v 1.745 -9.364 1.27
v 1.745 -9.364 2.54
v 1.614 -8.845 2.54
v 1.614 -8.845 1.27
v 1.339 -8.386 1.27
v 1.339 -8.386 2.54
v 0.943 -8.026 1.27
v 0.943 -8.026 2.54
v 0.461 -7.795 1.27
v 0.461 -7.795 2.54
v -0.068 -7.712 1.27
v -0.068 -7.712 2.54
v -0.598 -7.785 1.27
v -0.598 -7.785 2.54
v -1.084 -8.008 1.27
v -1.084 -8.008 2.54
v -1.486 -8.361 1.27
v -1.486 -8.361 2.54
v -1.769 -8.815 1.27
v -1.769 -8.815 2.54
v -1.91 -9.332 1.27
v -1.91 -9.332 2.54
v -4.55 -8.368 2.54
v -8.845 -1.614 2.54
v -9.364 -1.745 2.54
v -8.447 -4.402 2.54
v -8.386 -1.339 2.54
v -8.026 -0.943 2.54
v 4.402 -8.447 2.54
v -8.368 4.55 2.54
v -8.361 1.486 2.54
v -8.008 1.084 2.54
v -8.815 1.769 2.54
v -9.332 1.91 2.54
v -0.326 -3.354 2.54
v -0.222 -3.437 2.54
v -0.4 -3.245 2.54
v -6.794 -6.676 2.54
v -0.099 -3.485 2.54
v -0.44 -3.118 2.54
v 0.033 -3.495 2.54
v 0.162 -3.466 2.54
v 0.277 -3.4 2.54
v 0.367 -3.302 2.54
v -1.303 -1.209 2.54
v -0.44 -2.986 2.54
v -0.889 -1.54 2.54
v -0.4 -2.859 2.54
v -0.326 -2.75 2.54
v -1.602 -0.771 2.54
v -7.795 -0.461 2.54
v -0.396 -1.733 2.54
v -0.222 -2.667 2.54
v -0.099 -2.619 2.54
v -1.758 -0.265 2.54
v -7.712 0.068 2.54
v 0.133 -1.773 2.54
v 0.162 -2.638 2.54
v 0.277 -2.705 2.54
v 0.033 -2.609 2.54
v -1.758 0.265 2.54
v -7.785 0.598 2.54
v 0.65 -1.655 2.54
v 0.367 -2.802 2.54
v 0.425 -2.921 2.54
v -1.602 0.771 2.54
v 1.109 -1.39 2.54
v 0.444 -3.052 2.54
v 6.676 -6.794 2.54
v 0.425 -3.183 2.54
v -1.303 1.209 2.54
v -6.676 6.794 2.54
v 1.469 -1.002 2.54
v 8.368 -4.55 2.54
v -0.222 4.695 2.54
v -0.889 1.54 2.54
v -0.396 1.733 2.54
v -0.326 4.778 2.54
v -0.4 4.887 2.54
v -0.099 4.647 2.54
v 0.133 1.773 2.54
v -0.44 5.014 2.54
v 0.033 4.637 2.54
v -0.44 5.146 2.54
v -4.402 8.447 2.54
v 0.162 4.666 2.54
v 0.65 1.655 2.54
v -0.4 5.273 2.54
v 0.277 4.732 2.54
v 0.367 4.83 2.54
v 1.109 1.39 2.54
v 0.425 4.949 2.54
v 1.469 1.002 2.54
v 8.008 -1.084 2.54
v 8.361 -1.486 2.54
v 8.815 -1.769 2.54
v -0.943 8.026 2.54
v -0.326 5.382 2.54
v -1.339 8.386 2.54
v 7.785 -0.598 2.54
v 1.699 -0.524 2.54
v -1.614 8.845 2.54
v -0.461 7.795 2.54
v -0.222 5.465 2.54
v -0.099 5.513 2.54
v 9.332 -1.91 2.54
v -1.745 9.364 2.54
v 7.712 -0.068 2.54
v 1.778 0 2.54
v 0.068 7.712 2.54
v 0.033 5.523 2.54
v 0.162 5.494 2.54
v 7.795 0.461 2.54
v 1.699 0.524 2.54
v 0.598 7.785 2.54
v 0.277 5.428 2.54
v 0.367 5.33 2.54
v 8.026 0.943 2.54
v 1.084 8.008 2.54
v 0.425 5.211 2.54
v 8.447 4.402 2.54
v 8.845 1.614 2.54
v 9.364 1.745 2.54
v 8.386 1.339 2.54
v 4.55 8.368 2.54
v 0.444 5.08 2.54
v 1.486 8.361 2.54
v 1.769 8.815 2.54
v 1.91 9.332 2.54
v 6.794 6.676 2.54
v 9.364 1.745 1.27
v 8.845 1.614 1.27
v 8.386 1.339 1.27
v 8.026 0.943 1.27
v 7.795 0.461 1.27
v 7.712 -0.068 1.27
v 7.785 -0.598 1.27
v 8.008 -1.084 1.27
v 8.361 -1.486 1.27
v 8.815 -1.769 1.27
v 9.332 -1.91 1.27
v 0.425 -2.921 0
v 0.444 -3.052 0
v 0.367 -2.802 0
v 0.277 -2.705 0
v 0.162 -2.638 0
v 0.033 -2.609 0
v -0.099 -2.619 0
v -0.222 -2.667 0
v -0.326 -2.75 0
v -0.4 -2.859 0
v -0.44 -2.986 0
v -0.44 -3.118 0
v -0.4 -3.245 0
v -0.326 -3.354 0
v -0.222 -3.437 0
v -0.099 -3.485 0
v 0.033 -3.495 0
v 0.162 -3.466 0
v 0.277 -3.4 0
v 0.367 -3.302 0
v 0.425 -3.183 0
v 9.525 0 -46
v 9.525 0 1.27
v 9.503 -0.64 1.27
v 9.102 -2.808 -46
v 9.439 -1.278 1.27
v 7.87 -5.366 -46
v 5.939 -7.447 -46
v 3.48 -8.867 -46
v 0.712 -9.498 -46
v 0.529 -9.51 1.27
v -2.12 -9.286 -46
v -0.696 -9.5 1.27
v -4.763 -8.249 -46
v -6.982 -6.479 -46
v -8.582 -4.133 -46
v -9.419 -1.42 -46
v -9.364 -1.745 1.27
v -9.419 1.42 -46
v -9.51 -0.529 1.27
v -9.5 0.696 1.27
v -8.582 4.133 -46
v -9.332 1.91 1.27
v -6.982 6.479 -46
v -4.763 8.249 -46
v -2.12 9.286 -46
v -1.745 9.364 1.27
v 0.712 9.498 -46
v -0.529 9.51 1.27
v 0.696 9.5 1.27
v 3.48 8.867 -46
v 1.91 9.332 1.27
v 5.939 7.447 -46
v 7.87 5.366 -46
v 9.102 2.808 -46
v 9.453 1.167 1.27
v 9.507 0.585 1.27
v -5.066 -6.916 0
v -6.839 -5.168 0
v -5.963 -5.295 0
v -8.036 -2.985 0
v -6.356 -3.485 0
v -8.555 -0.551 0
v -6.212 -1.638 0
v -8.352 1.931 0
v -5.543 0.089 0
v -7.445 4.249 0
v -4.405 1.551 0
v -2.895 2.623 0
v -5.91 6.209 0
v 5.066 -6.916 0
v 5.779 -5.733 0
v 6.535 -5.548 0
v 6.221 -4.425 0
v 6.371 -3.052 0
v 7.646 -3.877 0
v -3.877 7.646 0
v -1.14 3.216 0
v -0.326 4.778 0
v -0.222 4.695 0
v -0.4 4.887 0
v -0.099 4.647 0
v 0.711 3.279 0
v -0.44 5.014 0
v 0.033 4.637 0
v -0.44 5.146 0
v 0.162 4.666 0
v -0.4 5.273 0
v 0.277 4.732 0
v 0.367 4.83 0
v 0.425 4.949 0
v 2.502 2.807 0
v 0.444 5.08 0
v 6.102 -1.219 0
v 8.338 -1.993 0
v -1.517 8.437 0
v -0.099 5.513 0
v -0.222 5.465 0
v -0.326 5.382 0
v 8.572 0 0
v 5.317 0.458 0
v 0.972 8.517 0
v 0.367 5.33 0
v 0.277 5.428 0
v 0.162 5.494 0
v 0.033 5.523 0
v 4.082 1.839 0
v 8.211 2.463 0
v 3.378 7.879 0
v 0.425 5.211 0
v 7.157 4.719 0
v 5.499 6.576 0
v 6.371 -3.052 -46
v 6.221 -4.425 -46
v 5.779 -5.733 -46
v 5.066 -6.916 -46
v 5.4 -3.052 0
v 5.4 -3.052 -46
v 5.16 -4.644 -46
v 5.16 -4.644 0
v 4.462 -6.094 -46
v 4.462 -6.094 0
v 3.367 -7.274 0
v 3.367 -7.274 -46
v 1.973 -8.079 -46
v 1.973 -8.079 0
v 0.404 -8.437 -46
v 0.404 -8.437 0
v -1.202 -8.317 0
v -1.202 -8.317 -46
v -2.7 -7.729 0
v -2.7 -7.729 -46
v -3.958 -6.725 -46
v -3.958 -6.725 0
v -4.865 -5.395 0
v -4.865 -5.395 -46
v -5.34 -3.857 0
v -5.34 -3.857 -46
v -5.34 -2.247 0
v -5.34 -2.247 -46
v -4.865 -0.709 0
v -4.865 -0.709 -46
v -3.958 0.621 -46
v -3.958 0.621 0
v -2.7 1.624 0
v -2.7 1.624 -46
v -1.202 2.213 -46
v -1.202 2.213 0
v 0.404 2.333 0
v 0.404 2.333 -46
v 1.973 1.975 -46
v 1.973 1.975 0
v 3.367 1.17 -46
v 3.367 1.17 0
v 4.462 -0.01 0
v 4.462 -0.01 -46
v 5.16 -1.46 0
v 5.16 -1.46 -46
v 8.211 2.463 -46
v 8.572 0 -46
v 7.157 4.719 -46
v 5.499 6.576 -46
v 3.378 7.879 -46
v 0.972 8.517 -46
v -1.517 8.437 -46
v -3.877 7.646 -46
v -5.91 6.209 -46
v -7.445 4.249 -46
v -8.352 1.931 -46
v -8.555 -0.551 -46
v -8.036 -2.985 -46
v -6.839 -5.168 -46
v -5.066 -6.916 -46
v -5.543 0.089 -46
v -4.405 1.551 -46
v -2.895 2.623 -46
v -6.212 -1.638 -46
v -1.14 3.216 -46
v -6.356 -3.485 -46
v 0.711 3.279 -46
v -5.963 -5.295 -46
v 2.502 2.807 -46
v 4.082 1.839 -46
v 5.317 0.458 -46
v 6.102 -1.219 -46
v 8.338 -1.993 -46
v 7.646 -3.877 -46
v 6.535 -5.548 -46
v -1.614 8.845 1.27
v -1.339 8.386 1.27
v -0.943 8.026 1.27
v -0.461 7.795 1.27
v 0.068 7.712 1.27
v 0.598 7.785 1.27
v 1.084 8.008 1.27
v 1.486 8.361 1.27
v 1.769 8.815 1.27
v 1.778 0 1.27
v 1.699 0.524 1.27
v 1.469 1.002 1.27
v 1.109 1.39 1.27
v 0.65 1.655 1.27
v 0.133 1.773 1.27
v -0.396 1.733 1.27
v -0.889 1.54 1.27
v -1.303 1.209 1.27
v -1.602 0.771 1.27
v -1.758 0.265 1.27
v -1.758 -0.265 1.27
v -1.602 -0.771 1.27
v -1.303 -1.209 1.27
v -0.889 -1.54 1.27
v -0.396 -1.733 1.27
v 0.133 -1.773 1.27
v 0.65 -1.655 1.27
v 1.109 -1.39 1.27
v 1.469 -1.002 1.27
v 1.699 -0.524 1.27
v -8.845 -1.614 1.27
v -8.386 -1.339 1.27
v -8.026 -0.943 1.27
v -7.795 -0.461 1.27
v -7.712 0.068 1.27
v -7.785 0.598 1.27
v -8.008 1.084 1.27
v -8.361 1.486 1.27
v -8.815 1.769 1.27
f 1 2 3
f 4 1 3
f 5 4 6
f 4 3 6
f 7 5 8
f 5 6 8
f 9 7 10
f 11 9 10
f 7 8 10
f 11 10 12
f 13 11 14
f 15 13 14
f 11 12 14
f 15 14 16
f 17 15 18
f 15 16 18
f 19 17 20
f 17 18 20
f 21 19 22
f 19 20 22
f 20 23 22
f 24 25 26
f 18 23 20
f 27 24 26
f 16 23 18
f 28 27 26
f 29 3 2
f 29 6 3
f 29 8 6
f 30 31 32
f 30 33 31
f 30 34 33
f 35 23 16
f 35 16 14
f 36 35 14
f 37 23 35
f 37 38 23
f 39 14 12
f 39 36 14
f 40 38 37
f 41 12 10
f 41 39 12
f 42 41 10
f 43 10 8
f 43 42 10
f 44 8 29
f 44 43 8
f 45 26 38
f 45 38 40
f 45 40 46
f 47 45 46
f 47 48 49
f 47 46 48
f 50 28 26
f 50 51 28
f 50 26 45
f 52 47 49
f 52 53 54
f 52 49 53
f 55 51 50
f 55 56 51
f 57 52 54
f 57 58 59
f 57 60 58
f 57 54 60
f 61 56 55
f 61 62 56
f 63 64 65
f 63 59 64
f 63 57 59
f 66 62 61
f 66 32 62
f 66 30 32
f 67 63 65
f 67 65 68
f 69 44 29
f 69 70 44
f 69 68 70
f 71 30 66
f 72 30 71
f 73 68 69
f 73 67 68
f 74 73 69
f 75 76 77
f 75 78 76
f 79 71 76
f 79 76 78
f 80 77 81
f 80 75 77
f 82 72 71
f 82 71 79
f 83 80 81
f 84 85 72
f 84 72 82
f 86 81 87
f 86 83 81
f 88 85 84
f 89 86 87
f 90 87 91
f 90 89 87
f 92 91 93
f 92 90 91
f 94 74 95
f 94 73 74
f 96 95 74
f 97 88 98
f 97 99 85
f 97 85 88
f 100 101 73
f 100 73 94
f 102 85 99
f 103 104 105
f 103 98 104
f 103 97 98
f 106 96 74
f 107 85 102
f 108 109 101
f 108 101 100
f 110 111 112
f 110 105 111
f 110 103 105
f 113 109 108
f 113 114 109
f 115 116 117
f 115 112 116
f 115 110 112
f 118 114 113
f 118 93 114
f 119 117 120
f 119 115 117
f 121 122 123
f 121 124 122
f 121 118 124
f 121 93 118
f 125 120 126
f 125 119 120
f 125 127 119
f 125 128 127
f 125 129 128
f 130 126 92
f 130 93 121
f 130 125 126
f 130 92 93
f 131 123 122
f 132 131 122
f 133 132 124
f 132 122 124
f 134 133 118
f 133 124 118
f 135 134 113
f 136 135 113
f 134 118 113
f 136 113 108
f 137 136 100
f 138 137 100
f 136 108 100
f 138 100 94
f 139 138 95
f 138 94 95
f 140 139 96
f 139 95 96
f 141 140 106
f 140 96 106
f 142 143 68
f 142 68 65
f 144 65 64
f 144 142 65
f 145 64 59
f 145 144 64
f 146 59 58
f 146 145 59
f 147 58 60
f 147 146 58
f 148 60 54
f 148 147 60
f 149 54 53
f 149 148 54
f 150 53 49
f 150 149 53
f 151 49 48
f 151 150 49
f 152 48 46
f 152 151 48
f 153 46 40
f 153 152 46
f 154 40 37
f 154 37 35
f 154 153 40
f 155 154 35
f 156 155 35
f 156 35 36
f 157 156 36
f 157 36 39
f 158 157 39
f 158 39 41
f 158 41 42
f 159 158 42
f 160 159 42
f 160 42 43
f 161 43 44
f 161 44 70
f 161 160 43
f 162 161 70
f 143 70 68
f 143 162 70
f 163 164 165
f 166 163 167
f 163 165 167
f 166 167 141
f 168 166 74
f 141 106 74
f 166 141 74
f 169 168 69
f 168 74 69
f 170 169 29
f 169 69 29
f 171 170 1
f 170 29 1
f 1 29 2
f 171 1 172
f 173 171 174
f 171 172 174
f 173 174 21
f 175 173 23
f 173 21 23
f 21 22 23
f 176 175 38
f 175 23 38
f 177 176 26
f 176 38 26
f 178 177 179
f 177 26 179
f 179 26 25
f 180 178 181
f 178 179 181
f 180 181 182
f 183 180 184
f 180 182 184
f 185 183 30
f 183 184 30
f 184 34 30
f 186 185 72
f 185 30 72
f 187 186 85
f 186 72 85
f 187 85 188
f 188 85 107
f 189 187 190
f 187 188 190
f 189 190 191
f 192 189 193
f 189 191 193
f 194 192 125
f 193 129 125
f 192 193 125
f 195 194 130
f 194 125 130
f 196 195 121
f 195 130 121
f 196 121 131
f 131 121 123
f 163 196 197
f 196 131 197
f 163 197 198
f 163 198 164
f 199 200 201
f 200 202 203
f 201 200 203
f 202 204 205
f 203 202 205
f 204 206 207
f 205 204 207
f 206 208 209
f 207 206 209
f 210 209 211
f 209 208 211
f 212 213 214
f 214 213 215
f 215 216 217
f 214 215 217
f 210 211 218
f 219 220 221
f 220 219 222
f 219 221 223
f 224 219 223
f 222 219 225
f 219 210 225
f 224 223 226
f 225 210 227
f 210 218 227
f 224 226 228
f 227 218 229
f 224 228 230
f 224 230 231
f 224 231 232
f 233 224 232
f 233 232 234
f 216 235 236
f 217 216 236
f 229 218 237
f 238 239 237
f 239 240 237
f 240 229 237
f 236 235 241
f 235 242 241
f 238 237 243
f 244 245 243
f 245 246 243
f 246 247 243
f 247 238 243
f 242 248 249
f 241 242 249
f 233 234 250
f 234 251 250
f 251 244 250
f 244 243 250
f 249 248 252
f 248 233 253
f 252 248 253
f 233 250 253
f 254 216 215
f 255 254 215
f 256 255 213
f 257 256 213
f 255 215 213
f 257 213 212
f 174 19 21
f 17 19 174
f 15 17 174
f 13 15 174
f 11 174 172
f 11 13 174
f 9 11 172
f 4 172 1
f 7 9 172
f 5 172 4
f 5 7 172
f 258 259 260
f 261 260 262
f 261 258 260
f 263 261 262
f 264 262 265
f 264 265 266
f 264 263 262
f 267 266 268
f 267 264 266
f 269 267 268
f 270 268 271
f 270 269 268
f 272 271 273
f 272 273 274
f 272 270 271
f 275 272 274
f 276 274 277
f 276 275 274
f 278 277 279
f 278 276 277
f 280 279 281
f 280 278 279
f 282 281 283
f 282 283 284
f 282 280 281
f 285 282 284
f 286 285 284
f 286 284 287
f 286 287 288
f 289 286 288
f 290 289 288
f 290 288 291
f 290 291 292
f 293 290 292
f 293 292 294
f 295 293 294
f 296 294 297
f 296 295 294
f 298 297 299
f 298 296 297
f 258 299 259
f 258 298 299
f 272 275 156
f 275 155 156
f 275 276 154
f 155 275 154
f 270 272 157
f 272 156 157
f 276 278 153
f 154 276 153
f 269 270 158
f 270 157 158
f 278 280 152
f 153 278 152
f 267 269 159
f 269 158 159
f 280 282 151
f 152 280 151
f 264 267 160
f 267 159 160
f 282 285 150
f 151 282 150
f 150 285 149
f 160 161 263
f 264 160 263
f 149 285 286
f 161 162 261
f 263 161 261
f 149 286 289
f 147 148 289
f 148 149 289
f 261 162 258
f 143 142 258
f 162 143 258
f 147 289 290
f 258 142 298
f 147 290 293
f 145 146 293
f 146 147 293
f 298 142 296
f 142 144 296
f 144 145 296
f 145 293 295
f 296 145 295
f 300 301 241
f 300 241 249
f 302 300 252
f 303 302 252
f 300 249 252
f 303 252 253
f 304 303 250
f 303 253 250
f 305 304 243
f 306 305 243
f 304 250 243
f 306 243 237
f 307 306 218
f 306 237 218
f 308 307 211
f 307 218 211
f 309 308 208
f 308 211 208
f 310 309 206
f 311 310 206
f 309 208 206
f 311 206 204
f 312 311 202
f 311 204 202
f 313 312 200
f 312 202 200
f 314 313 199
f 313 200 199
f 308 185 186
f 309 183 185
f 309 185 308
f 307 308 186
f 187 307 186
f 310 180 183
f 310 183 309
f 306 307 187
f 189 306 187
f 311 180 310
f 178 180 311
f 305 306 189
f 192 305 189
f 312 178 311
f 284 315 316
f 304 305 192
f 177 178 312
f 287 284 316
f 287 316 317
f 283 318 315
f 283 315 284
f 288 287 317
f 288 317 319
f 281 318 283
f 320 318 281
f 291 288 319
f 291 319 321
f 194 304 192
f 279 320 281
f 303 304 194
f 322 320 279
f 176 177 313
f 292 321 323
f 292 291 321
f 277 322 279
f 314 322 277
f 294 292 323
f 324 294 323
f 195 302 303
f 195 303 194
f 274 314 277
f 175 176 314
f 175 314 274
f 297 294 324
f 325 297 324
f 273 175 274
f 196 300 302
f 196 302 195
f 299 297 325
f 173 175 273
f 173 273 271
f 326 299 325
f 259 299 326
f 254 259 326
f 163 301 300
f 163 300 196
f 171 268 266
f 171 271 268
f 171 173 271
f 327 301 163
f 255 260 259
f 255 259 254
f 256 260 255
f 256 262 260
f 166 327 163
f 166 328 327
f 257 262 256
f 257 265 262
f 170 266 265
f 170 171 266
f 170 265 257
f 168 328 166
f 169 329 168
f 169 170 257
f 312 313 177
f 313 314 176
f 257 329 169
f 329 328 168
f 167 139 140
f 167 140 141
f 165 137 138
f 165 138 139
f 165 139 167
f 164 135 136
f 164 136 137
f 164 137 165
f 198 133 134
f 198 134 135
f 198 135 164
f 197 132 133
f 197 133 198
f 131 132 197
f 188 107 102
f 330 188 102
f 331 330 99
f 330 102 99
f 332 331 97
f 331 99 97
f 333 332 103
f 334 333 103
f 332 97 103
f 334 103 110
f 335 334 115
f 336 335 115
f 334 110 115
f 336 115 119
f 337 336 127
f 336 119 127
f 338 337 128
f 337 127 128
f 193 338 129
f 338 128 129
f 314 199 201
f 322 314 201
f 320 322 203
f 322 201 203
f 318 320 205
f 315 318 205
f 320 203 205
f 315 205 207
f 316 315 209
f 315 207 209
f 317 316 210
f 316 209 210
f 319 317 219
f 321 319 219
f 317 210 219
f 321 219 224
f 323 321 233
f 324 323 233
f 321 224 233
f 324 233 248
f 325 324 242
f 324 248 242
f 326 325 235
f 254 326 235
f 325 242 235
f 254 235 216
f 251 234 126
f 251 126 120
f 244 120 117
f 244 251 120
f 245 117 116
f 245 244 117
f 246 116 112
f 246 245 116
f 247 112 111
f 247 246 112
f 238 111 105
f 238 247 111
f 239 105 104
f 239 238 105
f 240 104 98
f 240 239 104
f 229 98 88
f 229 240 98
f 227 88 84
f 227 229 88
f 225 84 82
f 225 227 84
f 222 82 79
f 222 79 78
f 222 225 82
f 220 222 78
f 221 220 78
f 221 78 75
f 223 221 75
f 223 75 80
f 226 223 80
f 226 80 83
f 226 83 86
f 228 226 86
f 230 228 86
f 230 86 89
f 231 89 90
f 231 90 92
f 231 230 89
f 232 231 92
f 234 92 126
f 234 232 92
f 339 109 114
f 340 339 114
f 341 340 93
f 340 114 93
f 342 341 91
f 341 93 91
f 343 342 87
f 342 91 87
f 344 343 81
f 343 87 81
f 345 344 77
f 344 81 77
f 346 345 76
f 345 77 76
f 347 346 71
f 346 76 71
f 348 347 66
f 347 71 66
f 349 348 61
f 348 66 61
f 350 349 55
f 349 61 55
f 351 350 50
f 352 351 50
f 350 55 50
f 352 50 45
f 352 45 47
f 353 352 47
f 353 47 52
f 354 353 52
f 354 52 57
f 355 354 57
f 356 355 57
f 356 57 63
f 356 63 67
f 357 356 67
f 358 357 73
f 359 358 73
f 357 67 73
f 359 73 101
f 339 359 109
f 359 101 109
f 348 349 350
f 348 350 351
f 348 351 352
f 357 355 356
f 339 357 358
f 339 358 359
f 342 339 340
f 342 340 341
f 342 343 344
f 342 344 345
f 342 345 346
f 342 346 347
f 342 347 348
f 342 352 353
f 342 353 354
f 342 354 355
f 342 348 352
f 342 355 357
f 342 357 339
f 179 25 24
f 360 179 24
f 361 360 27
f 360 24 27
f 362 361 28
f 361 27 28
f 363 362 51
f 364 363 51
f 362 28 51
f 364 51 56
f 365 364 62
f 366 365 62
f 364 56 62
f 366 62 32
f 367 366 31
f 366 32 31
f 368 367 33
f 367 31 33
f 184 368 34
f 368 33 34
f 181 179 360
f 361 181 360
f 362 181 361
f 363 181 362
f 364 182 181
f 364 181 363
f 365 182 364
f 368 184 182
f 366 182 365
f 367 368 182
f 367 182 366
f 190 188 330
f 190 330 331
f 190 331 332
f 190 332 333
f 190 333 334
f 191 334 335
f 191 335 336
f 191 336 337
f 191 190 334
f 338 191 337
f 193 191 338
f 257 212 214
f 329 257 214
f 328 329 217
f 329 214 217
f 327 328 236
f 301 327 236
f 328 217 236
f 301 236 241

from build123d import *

# Parameters (mm, degrees)
F0_R     = 9.525
F0_R_2   = 0.4445
F1_DEPTH = 2.54
F2_R     = 1.778
F3_DEPTH = 1.27
F4_R     = 9.525
F4_R_2   = 5.4
F5_DEPTH = 46


# Not quite as in the source:
# - a feature names something its author has since deleted; it is built from what else it names


with BuildPart() as f1:
    # F0 (on Top) → F1 (new body)
    with BuildSketch(Plane.XY):
        Circle(F0_R)
        with Locations((0, -3.0520705041)):
            Circle(F0_R_2, mode=Mode.SUBTRACT)
        with Locations((0, 5.08)):
            Circle(F0_R_2, mode=Mode.SUBTRACT)
    extrude(amount=F1_DEPTH)

    # F2 (on face) → F3 (cut)
    with BuildSketch(Plane.XY.offset(2.54)):
        Circle(F2_R)
        with BuildLine():
            ThreePointArc((9.525, 0), (9.4846037847, 0.876308192), (9.3637577853, 1.7451834108))
            ThreePointArc((9.3637577853, 1.7451834108), (7.7122697392, -0.0678733407), (9.3315921315, -1.9097155001))
            ThreePointArc((9.3315921315, -1.9097155001), (9.4765246808, -0.9597421392), (9.525, 0))
        make_face()
        with BuildLine():
            ThreePointArc((-1.7451834108, 9.3637577853), (0.0678733407, 7.7122697392), (1.9097155001, 9.3315921315))
            ThreePointArc((1.9097155001, 9.3315921315), (0.0838233823, 9.5246311551), (-1.7451834108, 9.3637577853))
        make_face()
        with BuildLine():
            ThreePointArc((-1.9097155001, -9.3315921315), (-0.0838233823, -9.5246311551), (1.7451834108, -9.3637577853))
            ThreePointArc((1.7451834108, -9.3637577853), (-0.0678733407, -7.7122697392), (-1.9097155001, -9.3315921315))
        make_face()
        with BuildLine():
            ThreePointArc((-9.3637577853, -1.7451834108), (-7.7122697392, 0.0678733407), (-9.3315921315, 1.9097155001))
            ThreePointArc((-9.3315921315, 1.9097155001), (-9.5246311551, 0.0838233823), (-9.3637577853, -1.7451834108))
        make_face()
    extrude(amount=-F3_DEPTH, mode=Mode.SUBTRACT)

    # F4 (on face) → F5 (join)
    with BuildSketch(Plane(origin=(0, 0, 0), x_dir=(1, 0, 0), z_dir=(0, 0, -1))):
        Circle(F4_R)
        with BuildLine():
            ThreePointArc((5.0657137645, 6.9156561732), (7.6457042676, 3.8769785274), (8.5725, 0))
            ThreePointArc((8.5725, 0), (-3.8769785274, -7.6457042676), (-5.0657137645, 6.9156561732))
            ThreePointArc((-5.0657137645, 6.9156561732), (0, 9.4230005905), (5.0657137645, 6.9156561732))
        make_face(mode=Mode.SUBTRACT)
        with BuildLine():
            ThreePointArc((6.3709300865, 3.0520705041), (6.0358122236, 5.0911195392), (5.0657137645, 6.9156561732))
            ThreePointArc((5.0657137645, 6.9156561732), (0, 8.5725), (-5.0657137645, 6.9156561732))
            ThreePointArc((-5.0657137645, 6.9156561732), (-2.0390490351, -2.9837417196), (6.3709300865, 3.0520705041))
        make_face()
        with Locations((0, 3.0520705041)):
            Circle(F4_R_2, mode=Mode.SUBTRACT)
        with BuildLine():
            ThreePointArc((-5.0657137645, 6.9156561732), (0, 8.5725), (5.0657137645, 6.9156561732))
            ThreePointArc((5.0657137645, 6.9156561732), (0, 9.4230005905), (-5.0657137645, 6.9156561732))
        make_face()
    extrude(amount=F5_DEPTH)


solid = f1.part
